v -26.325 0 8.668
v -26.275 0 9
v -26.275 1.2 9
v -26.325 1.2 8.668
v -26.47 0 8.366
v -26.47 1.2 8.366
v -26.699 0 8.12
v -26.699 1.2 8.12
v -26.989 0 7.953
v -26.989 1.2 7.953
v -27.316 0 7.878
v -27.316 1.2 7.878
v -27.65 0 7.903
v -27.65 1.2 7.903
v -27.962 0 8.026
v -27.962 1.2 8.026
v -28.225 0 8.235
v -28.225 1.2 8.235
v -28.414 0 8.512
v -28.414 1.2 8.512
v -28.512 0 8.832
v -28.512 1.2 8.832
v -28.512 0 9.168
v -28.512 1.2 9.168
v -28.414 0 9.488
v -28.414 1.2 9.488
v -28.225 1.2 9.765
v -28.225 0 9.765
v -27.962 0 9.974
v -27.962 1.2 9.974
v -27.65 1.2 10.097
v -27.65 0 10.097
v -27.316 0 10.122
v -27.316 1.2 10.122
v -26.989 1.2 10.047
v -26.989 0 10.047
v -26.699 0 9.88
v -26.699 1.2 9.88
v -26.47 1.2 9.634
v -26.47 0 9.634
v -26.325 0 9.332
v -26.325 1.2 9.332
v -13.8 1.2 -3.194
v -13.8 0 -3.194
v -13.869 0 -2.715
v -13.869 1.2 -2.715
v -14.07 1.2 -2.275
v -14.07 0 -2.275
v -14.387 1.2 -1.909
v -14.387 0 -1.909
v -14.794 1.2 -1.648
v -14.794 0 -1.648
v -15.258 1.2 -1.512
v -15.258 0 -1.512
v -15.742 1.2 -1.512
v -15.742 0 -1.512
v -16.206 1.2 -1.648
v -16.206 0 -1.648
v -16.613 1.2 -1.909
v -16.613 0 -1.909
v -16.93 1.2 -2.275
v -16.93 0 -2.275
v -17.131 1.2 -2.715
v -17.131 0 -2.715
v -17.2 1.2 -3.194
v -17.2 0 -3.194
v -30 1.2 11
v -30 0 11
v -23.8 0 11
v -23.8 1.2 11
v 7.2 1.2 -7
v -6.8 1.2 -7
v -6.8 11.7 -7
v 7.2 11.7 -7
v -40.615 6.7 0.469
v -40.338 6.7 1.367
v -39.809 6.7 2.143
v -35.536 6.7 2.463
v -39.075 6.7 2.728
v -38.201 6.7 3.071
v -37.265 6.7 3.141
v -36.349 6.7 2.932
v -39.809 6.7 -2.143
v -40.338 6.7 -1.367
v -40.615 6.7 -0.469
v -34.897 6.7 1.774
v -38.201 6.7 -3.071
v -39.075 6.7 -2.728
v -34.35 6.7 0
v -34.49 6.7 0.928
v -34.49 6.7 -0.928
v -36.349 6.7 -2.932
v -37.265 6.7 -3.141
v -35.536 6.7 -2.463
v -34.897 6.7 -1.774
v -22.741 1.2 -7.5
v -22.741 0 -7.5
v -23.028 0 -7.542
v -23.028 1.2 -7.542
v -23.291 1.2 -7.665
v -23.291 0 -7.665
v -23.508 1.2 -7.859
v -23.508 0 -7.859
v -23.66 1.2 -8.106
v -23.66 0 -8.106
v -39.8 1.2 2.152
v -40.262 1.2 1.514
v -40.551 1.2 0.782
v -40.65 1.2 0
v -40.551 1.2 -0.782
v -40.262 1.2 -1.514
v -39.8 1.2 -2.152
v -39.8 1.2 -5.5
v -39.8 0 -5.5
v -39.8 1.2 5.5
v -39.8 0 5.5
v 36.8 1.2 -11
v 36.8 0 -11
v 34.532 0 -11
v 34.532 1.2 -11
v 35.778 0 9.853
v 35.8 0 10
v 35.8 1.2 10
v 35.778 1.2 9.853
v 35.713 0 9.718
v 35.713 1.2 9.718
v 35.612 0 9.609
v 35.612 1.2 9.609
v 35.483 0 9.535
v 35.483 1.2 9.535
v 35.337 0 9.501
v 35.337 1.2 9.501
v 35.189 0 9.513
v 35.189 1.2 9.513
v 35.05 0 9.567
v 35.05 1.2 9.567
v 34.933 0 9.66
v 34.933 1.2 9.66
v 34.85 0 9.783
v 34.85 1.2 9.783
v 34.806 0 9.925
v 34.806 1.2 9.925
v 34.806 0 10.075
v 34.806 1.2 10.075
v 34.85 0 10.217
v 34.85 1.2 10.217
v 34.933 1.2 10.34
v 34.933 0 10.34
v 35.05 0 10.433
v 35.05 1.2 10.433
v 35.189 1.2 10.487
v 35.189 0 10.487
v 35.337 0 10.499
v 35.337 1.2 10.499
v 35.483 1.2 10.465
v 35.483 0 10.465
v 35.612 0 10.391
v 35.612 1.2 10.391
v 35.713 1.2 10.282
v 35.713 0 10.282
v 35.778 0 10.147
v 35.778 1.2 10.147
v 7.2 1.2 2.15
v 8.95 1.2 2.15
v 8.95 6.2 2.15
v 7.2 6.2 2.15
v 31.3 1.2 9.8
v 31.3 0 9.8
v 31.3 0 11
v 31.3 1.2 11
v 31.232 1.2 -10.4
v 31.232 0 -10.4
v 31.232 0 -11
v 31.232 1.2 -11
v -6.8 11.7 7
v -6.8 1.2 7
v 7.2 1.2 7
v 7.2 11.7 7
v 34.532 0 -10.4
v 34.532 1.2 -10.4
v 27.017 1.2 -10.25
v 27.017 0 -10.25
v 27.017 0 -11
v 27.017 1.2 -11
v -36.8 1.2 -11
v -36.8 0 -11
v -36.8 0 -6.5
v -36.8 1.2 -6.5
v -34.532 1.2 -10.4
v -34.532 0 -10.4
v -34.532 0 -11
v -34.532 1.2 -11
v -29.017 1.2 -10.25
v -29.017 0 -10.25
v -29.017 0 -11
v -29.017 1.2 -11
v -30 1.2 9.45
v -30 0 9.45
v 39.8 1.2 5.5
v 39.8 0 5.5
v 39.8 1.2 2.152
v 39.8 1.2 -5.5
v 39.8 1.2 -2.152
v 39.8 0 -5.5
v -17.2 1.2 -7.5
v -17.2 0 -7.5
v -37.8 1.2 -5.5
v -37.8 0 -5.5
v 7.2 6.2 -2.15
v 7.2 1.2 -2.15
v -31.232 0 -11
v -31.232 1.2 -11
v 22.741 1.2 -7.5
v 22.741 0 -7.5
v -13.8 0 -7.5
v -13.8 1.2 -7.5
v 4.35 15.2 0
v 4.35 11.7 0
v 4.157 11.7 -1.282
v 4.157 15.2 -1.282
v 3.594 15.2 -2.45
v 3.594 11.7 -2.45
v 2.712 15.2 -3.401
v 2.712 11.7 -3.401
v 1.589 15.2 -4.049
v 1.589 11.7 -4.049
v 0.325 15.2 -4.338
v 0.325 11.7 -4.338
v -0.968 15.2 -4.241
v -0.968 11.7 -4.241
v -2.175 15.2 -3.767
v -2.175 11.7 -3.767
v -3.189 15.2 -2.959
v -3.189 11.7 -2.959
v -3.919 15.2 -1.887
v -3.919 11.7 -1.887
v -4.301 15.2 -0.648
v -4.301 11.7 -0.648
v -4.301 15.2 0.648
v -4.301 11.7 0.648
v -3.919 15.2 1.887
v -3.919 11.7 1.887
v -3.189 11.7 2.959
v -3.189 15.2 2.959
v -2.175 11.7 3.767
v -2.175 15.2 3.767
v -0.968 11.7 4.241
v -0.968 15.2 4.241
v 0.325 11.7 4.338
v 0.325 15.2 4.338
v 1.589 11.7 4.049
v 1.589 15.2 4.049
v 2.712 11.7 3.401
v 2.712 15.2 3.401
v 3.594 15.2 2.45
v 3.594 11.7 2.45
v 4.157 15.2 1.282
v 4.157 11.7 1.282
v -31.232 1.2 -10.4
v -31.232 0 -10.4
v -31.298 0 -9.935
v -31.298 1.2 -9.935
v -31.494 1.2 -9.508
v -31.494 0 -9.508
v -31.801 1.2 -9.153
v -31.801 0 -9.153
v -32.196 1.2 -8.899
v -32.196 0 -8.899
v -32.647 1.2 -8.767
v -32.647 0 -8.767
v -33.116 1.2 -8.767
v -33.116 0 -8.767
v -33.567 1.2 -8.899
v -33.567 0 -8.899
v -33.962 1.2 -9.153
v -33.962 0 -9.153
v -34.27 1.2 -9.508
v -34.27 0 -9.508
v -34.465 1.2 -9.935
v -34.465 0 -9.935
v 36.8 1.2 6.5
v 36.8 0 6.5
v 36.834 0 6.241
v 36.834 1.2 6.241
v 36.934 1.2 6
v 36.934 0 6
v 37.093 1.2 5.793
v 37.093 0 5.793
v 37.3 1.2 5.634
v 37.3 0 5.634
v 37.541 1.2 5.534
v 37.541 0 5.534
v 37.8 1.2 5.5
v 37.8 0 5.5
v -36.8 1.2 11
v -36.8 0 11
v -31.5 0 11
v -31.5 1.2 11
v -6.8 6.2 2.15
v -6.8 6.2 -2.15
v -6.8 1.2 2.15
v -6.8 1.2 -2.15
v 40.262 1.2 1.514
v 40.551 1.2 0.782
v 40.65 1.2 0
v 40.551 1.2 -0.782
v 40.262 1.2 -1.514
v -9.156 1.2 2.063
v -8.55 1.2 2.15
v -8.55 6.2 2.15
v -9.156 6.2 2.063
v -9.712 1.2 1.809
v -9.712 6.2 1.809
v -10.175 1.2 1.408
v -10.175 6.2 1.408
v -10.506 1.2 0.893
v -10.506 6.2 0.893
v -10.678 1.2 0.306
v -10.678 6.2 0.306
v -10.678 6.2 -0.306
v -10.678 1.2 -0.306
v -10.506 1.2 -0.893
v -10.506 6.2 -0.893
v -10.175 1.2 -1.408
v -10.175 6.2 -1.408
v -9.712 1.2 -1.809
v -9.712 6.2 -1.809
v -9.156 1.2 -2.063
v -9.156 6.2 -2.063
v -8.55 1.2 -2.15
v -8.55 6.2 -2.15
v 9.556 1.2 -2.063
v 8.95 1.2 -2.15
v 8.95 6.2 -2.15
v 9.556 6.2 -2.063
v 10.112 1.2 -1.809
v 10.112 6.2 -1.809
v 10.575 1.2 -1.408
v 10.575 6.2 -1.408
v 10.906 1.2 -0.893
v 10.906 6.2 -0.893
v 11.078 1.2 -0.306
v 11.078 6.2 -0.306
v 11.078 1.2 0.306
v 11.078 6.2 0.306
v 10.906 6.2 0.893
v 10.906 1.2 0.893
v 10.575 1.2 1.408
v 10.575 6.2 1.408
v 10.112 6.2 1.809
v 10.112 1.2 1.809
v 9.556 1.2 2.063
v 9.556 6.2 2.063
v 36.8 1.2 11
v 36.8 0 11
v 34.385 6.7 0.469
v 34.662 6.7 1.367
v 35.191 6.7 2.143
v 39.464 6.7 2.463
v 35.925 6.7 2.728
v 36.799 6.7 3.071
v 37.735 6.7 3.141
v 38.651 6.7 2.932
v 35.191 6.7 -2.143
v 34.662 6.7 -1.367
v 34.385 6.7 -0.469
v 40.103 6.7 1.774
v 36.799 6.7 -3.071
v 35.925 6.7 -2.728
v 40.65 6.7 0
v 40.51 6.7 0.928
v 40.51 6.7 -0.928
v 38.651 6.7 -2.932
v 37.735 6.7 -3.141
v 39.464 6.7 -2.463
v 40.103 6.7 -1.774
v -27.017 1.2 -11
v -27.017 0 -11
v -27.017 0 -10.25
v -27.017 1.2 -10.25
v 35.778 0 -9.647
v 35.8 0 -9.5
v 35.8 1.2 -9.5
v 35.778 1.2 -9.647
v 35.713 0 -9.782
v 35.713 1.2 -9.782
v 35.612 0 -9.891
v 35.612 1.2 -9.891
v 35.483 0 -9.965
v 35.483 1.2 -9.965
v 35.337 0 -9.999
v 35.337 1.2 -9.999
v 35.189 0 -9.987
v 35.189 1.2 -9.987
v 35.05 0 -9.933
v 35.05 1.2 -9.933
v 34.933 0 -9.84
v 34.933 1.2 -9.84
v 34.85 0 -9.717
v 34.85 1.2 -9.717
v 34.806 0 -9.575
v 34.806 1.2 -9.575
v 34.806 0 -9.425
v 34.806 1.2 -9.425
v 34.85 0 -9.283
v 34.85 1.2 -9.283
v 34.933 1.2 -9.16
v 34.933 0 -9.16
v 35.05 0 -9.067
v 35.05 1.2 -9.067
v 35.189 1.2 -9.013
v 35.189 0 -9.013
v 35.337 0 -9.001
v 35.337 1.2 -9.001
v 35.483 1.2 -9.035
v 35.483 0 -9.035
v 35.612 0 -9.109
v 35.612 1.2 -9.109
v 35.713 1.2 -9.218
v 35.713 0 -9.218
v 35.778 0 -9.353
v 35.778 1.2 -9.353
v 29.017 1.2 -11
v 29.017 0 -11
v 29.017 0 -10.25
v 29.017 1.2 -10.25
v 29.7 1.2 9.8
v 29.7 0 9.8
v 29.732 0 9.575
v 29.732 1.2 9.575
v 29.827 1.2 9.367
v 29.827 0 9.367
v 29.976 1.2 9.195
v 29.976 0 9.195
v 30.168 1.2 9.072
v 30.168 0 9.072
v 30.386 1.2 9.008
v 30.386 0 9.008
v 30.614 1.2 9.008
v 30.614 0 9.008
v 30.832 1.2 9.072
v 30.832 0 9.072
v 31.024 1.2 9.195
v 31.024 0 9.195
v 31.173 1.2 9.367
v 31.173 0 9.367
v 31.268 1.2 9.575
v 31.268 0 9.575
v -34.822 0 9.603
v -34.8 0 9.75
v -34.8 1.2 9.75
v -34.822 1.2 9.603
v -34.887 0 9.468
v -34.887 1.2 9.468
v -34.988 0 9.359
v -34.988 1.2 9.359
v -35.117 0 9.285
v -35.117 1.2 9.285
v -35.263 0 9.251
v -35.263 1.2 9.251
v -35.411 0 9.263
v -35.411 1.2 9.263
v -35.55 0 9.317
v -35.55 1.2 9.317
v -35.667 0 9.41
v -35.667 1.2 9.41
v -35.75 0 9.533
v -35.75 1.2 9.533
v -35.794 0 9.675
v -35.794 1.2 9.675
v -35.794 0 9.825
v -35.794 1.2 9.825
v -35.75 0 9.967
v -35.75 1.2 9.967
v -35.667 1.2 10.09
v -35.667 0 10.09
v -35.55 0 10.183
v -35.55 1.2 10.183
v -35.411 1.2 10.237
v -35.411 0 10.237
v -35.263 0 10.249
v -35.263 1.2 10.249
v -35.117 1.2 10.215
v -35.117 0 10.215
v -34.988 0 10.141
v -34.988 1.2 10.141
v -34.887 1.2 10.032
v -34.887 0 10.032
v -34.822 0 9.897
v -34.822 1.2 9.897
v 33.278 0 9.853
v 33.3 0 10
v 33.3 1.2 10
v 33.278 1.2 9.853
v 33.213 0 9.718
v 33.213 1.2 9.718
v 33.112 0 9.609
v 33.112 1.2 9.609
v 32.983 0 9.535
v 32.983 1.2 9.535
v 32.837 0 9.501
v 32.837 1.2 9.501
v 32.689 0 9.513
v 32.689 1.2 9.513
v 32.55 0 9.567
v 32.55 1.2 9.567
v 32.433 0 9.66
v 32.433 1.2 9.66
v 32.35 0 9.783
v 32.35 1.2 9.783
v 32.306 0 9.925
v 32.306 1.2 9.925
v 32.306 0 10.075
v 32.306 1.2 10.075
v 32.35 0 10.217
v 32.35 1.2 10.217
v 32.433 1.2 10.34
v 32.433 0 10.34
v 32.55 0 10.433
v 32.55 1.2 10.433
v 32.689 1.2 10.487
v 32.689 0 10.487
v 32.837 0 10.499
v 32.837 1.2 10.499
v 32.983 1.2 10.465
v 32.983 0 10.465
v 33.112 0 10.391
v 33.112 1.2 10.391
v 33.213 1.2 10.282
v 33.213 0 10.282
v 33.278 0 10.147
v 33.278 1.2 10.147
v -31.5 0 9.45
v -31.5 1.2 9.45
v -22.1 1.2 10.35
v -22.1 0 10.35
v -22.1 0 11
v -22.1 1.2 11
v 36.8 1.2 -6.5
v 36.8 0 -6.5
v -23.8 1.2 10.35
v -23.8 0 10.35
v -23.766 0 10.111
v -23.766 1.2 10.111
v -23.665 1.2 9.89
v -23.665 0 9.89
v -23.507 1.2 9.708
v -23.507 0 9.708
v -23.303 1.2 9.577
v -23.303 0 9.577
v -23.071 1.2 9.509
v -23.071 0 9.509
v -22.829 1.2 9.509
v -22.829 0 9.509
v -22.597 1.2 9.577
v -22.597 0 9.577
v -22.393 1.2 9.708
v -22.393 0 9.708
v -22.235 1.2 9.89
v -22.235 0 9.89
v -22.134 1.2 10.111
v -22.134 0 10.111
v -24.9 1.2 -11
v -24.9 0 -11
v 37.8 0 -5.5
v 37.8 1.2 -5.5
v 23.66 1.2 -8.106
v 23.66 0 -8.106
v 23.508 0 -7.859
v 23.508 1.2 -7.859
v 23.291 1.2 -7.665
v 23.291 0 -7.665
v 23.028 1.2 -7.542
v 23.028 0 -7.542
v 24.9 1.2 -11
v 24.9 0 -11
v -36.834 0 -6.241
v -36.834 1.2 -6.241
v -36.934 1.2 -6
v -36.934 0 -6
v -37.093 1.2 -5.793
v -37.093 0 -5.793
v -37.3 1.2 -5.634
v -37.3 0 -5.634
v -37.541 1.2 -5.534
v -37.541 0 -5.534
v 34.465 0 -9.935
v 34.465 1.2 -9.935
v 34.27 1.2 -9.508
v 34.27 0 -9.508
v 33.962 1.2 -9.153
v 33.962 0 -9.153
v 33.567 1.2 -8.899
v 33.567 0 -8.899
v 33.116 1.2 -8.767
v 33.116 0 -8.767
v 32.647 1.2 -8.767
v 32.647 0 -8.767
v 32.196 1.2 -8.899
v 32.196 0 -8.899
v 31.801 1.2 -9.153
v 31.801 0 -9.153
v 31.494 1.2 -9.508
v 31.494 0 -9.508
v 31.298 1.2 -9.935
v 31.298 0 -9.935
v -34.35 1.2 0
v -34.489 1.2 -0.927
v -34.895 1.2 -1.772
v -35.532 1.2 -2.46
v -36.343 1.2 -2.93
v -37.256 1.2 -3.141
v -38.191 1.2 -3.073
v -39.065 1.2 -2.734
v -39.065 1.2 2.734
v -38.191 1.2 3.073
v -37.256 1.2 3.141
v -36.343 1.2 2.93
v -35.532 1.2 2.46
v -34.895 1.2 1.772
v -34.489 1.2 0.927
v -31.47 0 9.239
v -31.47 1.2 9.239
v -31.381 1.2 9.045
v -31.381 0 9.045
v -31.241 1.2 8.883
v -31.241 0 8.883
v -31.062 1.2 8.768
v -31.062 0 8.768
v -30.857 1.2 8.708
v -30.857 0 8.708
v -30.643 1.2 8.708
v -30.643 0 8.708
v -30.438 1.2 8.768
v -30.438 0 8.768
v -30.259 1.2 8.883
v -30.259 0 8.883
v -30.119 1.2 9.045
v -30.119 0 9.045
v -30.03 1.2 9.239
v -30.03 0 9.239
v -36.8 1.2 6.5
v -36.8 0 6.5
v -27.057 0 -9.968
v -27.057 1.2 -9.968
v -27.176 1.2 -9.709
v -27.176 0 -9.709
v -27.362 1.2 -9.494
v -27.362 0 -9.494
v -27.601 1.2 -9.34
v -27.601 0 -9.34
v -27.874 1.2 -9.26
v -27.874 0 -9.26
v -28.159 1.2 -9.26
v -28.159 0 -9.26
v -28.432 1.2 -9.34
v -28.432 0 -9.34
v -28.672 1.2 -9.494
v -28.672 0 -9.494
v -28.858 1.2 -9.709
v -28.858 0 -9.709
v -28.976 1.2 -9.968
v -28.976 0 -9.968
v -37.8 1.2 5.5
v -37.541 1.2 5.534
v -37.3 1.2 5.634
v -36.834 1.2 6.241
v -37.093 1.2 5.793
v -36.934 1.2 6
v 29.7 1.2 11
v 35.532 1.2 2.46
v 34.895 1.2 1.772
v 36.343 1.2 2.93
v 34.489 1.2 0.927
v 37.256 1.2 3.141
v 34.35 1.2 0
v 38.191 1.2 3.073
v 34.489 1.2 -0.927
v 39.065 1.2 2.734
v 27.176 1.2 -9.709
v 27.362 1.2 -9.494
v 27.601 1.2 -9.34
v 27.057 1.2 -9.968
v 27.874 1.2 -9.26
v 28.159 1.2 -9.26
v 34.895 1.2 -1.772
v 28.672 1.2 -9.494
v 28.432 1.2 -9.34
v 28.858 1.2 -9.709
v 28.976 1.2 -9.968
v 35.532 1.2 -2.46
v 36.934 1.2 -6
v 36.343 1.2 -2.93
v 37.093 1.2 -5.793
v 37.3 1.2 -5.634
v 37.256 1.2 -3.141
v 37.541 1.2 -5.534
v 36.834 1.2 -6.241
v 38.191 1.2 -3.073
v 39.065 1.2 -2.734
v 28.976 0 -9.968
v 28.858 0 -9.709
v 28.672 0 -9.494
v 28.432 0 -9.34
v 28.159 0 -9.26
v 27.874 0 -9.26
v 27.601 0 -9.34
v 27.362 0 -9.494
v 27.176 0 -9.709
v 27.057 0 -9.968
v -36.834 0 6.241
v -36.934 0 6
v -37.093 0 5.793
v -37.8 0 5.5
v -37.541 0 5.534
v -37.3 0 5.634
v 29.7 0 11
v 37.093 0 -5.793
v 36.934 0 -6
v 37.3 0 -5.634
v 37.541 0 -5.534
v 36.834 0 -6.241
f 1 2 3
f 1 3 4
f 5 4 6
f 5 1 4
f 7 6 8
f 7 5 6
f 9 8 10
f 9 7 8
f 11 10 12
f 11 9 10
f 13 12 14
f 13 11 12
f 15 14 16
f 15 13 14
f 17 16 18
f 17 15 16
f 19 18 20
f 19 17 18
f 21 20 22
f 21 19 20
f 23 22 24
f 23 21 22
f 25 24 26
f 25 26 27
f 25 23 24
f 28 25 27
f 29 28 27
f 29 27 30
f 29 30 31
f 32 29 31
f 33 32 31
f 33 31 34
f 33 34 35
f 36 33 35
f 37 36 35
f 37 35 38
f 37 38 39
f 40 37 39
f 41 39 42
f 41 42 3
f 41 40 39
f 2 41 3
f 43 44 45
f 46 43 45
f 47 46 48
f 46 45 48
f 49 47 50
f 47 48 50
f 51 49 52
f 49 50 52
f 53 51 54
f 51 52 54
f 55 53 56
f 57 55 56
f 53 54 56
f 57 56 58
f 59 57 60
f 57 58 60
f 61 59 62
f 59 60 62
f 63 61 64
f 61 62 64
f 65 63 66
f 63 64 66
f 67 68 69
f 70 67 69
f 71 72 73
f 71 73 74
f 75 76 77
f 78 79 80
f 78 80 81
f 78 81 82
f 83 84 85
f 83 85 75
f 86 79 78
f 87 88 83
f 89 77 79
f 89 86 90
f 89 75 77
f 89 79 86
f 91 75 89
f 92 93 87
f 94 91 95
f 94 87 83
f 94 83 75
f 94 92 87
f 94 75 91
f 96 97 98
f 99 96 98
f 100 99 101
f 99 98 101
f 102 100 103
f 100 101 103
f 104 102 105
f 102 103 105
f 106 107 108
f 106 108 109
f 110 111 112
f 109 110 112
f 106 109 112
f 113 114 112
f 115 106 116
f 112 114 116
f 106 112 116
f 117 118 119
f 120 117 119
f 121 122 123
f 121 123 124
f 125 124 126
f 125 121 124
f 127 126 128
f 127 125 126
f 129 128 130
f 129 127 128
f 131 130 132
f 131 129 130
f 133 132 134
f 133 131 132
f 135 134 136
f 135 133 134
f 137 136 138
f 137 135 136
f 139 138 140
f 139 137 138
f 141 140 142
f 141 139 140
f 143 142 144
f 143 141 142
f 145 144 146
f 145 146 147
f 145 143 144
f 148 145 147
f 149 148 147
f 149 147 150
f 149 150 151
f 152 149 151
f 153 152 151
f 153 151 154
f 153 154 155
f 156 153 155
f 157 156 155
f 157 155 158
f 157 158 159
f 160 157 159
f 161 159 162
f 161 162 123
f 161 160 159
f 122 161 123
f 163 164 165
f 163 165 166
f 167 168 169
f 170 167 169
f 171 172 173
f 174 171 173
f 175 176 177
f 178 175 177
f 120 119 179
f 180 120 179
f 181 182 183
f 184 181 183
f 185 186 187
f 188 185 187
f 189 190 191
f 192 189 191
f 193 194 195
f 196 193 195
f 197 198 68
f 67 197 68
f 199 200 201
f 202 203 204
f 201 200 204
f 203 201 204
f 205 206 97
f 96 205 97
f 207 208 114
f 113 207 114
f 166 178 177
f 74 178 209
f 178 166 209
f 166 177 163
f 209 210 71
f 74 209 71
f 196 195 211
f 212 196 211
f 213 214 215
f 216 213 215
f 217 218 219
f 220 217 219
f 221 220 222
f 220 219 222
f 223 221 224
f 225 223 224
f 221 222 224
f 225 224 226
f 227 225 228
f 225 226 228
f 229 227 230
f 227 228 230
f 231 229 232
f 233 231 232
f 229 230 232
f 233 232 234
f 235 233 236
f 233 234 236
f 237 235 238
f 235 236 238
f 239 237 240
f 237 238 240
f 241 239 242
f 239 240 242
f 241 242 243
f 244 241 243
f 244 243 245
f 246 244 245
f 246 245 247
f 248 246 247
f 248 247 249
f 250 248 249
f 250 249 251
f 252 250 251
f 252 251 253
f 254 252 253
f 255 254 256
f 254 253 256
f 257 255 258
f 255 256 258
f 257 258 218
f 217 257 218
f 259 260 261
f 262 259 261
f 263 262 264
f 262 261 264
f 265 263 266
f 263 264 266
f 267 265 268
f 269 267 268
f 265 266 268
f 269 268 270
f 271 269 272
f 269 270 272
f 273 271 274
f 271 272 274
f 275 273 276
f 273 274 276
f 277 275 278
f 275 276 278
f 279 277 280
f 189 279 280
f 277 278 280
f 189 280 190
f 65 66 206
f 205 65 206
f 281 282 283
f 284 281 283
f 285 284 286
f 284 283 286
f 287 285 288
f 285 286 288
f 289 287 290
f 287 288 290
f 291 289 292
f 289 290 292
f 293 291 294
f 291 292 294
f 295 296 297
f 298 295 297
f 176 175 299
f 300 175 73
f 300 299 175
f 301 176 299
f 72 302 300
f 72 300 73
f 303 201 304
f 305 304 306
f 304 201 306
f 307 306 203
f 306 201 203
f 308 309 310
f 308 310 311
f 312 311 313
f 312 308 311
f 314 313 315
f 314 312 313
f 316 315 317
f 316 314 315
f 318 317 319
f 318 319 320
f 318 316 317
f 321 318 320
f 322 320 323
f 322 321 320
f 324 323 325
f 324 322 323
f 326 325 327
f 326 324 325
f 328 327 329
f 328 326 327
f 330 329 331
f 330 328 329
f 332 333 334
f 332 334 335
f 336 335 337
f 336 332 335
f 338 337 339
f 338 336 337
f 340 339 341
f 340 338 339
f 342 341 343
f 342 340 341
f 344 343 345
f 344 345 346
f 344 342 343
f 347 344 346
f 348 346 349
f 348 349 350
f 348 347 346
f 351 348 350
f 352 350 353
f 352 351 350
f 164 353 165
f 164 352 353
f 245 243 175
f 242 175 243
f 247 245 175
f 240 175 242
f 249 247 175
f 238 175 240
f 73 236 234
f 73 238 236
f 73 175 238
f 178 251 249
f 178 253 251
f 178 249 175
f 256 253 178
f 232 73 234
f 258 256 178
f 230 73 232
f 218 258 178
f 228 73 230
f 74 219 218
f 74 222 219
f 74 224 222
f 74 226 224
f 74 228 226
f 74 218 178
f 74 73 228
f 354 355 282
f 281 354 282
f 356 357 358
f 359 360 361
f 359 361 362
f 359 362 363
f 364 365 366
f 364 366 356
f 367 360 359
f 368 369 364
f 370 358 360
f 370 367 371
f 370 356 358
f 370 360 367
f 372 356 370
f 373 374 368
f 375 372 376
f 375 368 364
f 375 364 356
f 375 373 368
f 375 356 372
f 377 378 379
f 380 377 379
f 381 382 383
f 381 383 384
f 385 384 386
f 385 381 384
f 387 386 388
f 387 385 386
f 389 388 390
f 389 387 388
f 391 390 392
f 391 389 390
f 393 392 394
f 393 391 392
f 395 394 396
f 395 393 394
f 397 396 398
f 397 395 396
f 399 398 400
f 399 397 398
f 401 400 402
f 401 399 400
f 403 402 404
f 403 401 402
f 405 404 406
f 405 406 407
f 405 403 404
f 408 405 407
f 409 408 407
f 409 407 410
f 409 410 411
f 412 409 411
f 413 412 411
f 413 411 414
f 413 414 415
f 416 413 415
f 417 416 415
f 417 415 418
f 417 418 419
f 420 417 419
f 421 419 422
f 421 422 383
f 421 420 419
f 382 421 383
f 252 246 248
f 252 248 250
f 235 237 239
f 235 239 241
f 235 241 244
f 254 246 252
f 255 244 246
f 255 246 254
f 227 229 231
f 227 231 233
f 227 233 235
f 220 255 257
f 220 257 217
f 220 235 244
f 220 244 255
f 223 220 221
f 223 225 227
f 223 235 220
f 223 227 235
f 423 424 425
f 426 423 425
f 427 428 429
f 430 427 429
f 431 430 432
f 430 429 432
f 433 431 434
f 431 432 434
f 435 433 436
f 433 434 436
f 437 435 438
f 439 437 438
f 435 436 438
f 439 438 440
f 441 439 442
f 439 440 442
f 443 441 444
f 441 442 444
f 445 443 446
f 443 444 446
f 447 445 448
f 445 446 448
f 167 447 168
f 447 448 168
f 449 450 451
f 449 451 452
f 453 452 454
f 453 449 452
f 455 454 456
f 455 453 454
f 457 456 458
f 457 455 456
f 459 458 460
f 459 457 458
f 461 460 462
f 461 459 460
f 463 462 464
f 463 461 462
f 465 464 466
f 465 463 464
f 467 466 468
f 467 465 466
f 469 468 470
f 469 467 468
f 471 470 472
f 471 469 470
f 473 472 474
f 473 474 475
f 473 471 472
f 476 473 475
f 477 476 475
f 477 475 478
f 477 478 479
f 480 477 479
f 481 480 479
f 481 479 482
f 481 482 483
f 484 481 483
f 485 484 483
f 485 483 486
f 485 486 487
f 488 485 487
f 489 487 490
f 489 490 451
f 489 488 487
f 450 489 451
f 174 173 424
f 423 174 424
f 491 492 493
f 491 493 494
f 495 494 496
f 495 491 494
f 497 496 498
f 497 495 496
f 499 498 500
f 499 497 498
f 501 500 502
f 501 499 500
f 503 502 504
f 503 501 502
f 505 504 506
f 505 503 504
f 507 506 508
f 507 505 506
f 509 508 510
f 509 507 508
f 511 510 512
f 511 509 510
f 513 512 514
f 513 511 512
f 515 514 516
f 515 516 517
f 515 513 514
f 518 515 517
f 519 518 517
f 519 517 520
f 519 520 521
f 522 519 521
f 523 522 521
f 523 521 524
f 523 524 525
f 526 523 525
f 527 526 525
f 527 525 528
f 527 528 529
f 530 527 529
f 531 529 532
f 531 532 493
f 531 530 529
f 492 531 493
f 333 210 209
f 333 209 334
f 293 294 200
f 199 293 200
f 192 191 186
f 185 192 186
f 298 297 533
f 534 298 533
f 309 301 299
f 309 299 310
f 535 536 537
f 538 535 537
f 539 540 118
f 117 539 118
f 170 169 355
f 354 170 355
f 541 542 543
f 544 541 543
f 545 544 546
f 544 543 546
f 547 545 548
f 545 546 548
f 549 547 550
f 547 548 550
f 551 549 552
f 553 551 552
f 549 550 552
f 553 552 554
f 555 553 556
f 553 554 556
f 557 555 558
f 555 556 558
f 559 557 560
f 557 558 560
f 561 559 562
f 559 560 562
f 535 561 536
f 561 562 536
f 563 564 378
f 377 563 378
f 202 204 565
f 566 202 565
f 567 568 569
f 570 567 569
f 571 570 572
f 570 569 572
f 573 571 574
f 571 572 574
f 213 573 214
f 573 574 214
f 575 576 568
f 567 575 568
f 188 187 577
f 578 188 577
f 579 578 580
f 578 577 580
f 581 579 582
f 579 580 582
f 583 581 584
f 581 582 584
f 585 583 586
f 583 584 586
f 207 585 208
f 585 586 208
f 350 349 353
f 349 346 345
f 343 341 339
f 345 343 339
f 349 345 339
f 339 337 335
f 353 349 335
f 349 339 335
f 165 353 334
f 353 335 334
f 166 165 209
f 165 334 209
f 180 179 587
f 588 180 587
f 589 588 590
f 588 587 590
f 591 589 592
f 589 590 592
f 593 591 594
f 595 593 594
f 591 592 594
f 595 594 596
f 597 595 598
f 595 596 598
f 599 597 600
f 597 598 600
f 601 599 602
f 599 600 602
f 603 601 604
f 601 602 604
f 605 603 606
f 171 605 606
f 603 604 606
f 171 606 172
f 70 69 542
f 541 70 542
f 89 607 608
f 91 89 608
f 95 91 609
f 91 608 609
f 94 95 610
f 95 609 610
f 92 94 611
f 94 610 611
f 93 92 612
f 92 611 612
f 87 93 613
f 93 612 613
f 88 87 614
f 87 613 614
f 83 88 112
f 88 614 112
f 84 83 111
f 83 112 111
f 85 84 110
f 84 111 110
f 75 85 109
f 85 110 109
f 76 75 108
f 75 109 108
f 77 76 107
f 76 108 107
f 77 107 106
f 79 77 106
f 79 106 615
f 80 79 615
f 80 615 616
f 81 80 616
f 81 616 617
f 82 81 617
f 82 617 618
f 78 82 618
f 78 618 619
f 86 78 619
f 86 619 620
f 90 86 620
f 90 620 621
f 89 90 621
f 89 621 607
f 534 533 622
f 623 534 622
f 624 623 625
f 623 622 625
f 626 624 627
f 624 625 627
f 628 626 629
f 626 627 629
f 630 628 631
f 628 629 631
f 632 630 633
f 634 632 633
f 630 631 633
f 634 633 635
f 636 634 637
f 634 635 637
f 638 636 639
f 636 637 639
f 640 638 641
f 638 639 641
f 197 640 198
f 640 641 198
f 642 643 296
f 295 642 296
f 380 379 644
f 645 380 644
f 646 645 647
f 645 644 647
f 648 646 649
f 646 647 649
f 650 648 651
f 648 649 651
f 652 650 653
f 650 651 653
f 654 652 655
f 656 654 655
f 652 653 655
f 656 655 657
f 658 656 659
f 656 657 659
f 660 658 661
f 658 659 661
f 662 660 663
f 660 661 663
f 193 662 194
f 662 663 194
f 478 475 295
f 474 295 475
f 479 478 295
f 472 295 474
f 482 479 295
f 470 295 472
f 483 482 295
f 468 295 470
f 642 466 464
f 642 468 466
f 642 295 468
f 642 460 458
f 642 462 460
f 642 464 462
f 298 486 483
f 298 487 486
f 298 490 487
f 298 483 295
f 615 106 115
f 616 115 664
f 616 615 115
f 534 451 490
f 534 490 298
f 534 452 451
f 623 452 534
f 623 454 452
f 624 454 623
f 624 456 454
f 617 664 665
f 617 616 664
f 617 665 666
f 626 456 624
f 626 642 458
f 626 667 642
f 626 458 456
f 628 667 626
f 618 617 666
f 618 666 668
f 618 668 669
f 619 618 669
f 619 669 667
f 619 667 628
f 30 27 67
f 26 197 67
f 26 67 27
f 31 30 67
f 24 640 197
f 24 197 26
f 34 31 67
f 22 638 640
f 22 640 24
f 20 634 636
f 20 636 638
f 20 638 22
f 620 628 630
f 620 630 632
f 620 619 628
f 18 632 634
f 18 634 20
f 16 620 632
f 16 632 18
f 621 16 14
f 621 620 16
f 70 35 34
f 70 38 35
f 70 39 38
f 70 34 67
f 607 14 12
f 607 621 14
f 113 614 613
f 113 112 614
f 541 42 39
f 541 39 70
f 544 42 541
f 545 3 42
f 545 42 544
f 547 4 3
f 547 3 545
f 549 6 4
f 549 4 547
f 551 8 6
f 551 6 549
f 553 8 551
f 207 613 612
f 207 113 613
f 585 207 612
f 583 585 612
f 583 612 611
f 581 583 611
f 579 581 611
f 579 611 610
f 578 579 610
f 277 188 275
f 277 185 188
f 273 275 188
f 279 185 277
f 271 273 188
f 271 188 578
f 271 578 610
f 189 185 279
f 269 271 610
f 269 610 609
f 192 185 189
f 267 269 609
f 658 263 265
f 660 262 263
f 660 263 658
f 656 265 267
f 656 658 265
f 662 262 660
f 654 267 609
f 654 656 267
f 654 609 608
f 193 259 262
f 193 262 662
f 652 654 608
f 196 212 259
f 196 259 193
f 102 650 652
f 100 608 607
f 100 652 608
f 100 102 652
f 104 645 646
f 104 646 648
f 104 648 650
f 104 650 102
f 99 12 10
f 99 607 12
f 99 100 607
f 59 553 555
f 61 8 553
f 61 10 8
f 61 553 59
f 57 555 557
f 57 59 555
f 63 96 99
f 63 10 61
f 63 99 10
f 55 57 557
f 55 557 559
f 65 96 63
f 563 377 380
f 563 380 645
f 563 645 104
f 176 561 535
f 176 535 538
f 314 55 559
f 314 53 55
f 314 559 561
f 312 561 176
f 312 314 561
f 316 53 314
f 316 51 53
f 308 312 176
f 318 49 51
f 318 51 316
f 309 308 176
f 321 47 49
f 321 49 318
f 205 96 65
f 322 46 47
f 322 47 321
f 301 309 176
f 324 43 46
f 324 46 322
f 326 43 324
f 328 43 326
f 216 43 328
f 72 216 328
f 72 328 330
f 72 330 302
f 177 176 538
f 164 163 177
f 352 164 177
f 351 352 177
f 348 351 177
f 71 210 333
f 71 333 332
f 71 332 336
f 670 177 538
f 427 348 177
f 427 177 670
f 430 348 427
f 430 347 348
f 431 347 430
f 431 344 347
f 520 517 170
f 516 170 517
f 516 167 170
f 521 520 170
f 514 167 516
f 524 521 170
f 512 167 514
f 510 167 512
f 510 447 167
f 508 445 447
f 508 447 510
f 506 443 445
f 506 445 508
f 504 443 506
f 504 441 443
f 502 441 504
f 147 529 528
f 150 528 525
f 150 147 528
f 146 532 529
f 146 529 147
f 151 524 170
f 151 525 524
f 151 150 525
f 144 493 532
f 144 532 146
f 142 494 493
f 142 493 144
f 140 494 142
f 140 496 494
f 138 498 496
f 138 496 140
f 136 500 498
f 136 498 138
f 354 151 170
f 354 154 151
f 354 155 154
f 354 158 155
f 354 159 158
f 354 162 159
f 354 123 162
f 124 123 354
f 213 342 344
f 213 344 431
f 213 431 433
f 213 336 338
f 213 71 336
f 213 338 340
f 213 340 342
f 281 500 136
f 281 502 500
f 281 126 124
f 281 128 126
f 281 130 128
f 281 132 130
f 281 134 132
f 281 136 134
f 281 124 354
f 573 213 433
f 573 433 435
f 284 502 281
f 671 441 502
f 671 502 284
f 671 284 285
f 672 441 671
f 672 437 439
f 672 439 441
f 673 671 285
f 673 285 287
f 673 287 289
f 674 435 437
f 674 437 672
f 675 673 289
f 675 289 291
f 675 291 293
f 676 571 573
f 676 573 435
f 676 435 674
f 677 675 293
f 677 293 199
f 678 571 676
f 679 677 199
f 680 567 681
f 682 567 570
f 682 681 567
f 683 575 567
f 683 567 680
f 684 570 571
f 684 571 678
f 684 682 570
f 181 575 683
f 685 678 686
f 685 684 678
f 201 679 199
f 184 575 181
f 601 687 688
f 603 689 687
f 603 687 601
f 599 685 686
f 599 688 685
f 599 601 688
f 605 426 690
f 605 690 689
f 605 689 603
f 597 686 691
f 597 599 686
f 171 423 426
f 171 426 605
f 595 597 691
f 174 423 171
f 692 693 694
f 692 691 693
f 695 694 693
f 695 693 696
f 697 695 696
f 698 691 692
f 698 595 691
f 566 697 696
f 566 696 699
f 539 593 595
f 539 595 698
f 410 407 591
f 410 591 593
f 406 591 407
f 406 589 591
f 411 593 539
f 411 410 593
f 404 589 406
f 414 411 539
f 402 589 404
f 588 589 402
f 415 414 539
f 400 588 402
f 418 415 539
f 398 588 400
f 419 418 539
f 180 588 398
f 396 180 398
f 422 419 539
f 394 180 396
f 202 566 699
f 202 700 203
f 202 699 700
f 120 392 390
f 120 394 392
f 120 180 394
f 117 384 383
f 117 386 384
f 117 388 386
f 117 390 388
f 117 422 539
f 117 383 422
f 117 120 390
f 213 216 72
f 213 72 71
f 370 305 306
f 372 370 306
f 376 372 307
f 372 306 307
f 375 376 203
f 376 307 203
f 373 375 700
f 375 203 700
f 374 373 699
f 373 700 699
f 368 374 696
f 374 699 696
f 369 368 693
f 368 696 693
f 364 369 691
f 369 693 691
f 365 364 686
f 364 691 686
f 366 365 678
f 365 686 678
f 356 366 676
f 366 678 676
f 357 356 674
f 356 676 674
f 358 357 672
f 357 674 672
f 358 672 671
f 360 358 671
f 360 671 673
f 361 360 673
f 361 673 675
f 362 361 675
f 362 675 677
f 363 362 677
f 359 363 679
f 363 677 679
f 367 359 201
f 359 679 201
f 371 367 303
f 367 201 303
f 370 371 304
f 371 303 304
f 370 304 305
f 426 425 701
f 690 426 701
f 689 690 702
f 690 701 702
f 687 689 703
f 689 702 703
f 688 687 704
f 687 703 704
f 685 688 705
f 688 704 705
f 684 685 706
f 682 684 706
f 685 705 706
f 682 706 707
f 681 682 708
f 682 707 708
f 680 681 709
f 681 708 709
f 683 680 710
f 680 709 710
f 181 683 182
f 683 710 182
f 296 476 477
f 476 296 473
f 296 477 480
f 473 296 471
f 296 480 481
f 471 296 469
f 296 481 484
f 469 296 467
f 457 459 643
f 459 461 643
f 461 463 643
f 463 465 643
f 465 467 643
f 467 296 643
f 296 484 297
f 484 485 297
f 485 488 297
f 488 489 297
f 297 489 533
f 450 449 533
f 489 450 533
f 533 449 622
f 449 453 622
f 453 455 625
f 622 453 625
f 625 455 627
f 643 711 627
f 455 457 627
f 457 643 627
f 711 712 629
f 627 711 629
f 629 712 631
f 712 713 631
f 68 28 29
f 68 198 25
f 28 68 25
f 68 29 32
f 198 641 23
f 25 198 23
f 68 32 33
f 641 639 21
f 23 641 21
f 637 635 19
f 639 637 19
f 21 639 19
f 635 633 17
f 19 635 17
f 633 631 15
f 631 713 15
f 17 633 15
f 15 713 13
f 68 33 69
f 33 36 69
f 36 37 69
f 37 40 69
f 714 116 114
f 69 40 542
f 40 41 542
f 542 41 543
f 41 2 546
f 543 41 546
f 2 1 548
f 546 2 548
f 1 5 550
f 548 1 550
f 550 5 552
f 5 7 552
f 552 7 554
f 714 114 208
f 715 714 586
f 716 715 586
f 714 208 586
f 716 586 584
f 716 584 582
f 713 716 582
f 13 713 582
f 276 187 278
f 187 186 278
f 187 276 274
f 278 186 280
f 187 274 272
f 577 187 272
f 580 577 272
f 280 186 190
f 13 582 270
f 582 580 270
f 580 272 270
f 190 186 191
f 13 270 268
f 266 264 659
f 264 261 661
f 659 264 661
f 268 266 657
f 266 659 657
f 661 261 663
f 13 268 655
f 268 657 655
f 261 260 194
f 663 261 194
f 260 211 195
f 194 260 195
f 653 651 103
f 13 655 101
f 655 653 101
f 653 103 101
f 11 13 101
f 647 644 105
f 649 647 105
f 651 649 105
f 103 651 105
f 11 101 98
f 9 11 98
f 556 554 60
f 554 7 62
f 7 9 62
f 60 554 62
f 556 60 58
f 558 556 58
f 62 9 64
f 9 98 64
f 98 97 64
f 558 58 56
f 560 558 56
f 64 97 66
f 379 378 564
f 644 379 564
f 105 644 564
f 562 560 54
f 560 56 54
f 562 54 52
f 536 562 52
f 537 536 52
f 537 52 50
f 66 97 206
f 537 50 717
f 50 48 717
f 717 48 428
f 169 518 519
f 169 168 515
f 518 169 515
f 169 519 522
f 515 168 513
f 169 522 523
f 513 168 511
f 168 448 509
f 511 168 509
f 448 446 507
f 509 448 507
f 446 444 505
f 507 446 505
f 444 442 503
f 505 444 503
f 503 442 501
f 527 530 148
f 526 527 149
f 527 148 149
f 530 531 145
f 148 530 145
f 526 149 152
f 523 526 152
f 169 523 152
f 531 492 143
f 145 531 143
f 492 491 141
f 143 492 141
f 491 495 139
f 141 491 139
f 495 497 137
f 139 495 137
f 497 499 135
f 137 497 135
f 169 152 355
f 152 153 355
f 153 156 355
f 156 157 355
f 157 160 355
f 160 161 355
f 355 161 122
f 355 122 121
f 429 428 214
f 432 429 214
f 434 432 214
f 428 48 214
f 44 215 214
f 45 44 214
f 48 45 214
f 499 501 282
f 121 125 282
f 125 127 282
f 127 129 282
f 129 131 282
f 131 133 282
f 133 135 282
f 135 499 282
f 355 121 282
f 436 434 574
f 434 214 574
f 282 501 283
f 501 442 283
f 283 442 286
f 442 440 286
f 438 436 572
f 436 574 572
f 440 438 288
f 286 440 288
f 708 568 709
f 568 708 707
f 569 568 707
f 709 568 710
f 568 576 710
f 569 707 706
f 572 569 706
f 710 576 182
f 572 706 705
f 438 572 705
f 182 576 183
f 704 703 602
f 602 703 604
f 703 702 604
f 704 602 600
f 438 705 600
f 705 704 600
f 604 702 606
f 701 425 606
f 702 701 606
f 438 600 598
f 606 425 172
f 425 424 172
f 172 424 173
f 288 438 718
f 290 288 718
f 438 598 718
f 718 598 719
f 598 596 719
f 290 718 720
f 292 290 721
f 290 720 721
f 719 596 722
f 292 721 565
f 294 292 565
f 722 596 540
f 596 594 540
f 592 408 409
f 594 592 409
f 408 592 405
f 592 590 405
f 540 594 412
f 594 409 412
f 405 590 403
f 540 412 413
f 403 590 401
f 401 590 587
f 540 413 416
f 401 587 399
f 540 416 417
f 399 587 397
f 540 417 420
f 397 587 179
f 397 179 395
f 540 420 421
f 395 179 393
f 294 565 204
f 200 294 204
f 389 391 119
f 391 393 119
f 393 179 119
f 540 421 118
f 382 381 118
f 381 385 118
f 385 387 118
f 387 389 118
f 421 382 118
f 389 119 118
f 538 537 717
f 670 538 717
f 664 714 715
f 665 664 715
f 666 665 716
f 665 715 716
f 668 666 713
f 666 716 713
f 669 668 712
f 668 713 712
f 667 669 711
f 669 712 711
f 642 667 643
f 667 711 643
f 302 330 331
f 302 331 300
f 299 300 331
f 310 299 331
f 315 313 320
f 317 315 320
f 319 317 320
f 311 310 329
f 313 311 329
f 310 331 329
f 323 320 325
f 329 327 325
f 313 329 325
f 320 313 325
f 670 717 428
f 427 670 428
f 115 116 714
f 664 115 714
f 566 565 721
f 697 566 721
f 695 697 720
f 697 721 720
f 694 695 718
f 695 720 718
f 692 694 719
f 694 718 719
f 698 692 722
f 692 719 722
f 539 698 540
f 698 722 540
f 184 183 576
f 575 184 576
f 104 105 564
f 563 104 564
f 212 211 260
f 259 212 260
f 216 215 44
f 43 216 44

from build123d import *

# Parameters (mm, degrees)
SKETCH1_R                = 0.5
SKETCH1_R_2              = 1.125
PCB_DEPTH                = 1.2
SKETCH2_R                = 3.15
SPEAKERS_DEPTH           = 5.5
SKETCH3_W                = 14
SKETCH3_H                = 14
LENS_MOUNT_DEPTH         = 10.5
LENS_MOUTING_HOLES_DEPTH = 5
SKETCH5_R                = 4.35
LENS_DEPTH               = 3.5


with BuildPart() as part:
    # Sketch1 → PCB (new body)
    with BuildSketch(Plane(origin=(0, 0, 0), x_dir=(1, 0, 0), z_dir=(0, 1, 0))):
        with BuildLine():
            Line((-36.8, -11), (-31.5, -11))
            Line((-31.5, -11), (-31.5, -9.45))
            ThreePointArc((-31.5, -9.45), (-30.75, -8.7), (-30, -9.45))
            Line((-30, -9.45), (-30, -11))
            Line((-30, -11), (-23.8, -11))
            Line((-23.8, -11), (-23.8, -10.35))
            ThreePointArc((-23.8, -10.35), (-22.95, -9.5), (-22.1, -10.35))
            Line((-22.1, -10.35), (-22.1, -11))
            Line((-22.1, -11), (29.7, -11))
            Line((29.7, -11), (29.7, -9.8))
            ThreePointArc((29.7, -9.8), (30.5, -9), (31.3, -9.8))
            Line((31.3, -9.8), (31.3, -11))
            Line((31.3, -11), (36.8, -11))
            Line((36.8, -11), (36.8, -6.5))
            ThreePointArc((36.8, -6.5), (37.092893219, -5.792893219), (37.8, -5.5))
            Line((37.8, -5.5), (39.8, -5.5))
            Line((39.8, -5.5), (39.8, 5.5))
            Line((39.8, 5.5), (37.8, 5.5))
            ThreePointArc((37.8, 5.5), (37.092893219, 5.792893219), (36.8, 6.5))
            Line((36.8, 6.5), (36.8, 11))
            Line((36.8, 11), (34.531625915, 11))
            Line((34.531625915, 11), (34.531625915, 10.4))
            ThreePointArc((34.531625915, 10.4), (32.881625915, 8.75), (31.231625915, 10.4))
            Line((31.231625915, 10.4), (31.231625915, 11))
            Line((31.231625915, 11), (29.016759255, 11))
            Line((29.016759255, 11), (29.016759255, 10.25))
            ThreePointArc((29.016759255, 10.25), (28.016759255, 9.25), (27.016759255, 10.25))
            Line((27.016759255, 10.25), (27.016759255, 11))
            Line((27.016759255, 11), (24.9, 11))
            Line((24.9, 11), (23.659748872, 8.106080701))
            ThreePointArc((23.659748872, 8.106080701), (23.291094851, 7.665158908), (22.740603842, 7.5))
            Line((22.740603842, 7.5), (-13.8, 7.5))
            Line((-13.8, 7.5), (-13.8, 3.194222302))
            ThreePointArc((-13.8, 3.194222302), (-15.5, 1.494222302), (-17.2, 3.194222302))
            Line((-17.2, 3.194222302), (-17.2, 7.5))
            Line((-17.2, 7.5), (-22.740603842, 7.5))
            ThreePointArc((-22.740603842, 7.5), (-23.291094851, 7.665158908), (-23.659748872, 8.106080701))
            Line((-23.659748872, 8.106080701), (-24.9, 11))
            Line((-24.9, 11), (-27.016759255, 11))
            Line((-27.016759255, 11), (-27.016759255, 10.25))
            ThreePointArc((-27.016759255, 10.25), (-28.016759255, 9.25), (-29.016759255, 10.25))
            Line((-29.016759255, 10.25), (-29.016759255, 11))
            Line((-29.016759255, 11), (-31.231625915, 11))
            Line((-31.231625915, 11), (-31.231625915, 10.4))
            ThreePointArc((-31.231625915, 10.4), (-32.881625915, 8.75), (-34.531625915, 10.4))
            Line((-34.531625915, 10.4), (-34.531625915, 11))
            Line((-34.531625915, 11), (-36.8, 11))
            Line((-36.8, 11), (-36.8, 6.5))
            ThreePointArc((-36.8, 6.5), (-37.092893219, 5.792893219), (-37.8, 5.5))
            Line((-37.8, 5.5), (-39.8, 5.5))
            Line((-39.8, 5.5), (-39.8, -5.5))
            Line((-39.8, -5.5), (-37.8, -5.5))
            ThreePointArc((-37.8, -5.5), (-37.092893219, -5.792893219), (-36.8, -6.5))
            Line((-36.8, -6.5), (-36.8, -11))
        make_face()
        with Locations((35.3, 9.5)):
            Circle(SKETCH1_R, mode=Mode.SUBTRACT)
        with Locations((-35.3, -9.75)):
            Circle(SKETCH1_R, mode=Mode.SUBTRACT)
        with Locations((-27.4, -9)):
            Circle(SKETCH1_R_2, mode=Mode.SUBTRACT)
        with Locations((35.3, -10)):
            Circle(SKETCH1_R, mode=Mode.SUBTRACT)
        with Locations((32.8, -10)):
            Circle(SKETCH1_R, mode=Mode.SUBTRACT)
    extrude(amount=PCB_DEPTH)

    # Sketch2 → speakers (add)
    with BuildSketch(Plane(origin=(0, 1.2, 0), x_dir=(1, 0, 0), z_dir=(0, 1, 0))):
        with Locations((-37.5, 0)):
            Circle(SKETCH2_R)
        with Locations((37.5, 0)):
            Circle(SKETCH2_R)
    extrude(amount=SPEAKERS_DEPTH)

    # Sketch3 → lens_mount (add)
    with BuildSketch(Plane(origin=(0, 1.2, 0), x_dir=(1, 0, 0), z_dir=(0, 1, 0))):
        with Locations((0.2, 0)):
            Rectangle(SKETCH3_W, SKETCH3_H)
    extrude(amount=LENS_MOUNT_DEPTH)

    # Sketch4 → lens_mouting_holes (add)
    with BuildSketch(Plane(origin=(0, 1.2, 0), x_dir=(1, 0, 0), z_dir=(0, 1, 0))):
        with BuildLine():
            Line((-8.55, 2.15), (8.95, 2.15))
            ThreePointArc((8.95, 2.15), (11.1, 0), (8.95, -2.15))
            Line((8.95, -2.15), (-8.55, -2.15))
            ThreePointArc((-8.55, -2.15), (-10.7, 0), (-8.55, 2.15))
        make_face()
    extrude(amount=LENS_MOUTING_HOLES_DEPTH)

    # Sketch5 → lens (add)
    with BuildSketch(Plane(origin=(0, 11.7, 0), x_dir=(1, 0, 0), z_dir=(0, 1, 0))):
        Circle(SKETCH5_R)
    extrude(amount=LENS_DEPTH)


solid = part.part
